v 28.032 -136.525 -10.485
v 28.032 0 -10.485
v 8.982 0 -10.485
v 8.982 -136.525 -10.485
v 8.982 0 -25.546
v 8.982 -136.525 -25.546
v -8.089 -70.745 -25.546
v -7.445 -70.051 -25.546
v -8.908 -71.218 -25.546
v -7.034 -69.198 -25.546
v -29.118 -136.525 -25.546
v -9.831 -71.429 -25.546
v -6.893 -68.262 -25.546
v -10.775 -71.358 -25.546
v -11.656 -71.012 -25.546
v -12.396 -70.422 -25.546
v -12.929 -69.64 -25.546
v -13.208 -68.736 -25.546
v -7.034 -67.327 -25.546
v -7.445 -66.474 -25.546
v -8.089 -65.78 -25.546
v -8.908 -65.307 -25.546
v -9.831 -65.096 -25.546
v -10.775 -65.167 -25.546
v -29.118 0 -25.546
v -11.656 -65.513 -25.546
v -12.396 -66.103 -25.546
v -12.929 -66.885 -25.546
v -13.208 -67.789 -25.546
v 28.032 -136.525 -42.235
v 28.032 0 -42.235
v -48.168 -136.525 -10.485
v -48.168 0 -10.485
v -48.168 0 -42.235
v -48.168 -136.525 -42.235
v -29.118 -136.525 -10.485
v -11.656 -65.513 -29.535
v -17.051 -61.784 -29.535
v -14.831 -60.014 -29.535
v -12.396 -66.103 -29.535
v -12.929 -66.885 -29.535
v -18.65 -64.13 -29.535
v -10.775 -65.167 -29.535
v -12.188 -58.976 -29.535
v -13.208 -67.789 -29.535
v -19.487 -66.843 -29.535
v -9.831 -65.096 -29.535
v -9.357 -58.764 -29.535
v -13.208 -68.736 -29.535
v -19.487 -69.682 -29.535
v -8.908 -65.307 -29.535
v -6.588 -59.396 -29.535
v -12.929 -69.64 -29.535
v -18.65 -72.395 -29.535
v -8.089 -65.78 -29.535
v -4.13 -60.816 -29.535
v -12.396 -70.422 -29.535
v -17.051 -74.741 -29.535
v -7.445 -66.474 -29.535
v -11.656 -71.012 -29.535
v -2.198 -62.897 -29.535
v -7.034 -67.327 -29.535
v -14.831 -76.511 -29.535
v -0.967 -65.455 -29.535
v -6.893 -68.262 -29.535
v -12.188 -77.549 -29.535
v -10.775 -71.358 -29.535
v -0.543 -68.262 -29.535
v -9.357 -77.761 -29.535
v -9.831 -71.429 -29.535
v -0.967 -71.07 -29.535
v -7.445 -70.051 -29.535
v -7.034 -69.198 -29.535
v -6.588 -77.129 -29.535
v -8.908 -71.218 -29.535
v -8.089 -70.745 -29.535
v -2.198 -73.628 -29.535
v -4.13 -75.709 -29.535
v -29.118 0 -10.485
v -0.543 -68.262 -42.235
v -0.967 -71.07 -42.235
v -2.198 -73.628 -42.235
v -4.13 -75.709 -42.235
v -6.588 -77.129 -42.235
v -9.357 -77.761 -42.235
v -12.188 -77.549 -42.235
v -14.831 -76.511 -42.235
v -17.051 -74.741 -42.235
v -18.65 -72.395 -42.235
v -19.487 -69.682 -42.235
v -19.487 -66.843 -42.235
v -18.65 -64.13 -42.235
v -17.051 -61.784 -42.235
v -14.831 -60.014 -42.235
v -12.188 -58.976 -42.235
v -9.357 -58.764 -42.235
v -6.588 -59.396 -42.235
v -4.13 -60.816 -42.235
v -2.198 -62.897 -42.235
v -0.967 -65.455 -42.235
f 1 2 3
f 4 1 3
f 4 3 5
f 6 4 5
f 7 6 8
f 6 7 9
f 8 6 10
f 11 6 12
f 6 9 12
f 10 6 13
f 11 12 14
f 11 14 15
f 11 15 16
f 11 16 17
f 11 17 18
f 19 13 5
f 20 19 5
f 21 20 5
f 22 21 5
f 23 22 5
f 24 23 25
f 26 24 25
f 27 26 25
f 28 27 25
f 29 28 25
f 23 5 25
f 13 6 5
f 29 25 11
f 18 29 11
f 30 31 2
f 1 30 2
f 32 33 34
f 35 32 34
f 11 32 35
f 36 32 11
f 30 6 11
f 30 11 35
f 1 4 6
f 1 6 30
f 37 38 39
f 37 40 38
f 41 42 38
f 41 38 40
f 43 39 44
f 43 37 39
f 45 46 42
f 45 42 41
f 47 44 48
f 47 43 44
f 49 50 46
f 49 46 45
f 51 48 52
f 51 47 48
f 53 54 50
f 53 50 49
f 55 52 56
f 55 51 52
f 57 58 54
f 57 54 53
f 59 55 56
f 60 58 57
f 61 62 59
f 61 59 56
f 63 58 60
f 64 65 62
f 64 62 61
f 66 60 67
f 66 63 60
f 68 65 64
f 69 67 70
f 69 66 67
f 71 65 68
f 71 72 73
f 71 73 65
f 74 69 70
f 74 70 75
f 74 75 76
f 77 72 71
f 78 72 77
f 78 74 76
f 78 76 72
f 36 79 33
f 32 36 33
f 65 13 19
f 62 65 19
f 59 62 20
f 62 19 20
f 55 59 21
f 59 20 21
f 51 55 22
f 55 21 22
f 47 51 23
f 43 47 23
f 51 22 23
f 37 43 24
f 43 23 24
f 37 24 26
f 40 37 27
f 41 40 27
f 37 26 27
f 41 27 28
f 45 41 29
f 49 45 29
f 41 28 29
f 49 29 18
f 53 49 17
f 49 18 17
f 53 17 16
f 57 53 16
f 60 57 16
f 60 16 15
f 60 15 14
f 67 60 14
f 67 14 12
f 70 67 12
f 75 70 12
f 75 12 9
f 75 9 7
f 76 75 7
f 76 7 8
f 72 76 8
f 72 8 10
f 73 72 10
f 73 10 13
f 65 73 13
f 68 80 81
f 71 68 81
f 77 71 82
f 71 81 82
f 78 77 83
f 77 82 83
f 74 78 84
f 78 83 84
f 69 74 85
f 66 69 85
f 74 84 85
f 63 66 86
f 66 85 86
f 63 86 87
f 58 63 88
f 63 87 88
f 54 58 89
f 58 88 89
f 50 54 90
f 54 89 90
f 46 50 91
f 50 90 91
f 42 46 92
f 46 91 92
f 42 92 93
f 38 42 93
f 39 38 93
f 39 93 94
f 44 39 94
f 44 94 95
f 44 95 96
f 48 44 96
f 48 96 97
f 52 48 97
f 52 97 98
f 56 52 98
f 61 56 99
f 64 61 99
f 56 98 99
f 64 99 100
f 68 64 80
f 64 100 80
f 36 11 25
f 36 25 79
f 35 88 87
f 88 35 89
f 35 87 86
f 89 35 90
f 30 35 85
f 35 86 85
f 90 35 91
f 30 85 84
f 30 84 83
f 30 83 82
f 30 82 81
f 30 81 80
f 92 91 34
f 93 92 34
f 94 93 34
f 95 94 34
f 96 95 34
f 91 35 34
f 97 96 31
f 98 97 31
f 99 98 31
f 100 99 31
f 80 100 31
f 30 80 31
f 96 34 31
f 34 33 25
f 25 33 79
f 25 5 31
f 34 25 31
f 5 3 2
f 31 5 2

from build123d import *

# Parameters (mm, degrees)
F1_DEPTH = 136.525
F2_R     = 3.175
F3_DEPTH = 6.35
F5_R     = 9.525
F6_DEPTH = 12.7
F4_R     = 3.175
F7_DEPTH = 25.4


with BuildPart() as f1:
    # F0 (on Front) → F1 (new body)
    with BuildSketch(Plane.XZ):
        Polygon((-48.16837, -10.484883), (-48.16837, -42.234883), (28.03163, -42.234883), (28.03163, -10.484883), (8.98163, -10.484883), (8.98163, -25.545781), (-29.11837, -25.545781), (-29.11837, -10.484883), align=None)
    extrude(amount=F1_DEPTH)

    # F2 (on face) → F3 (join)
    with BuildSketch(Plane.XY.offset(-25.545781)):
        with Locations((-10.06837, -68.2625)):
            Circle(F2_R)
    extrude(amount=-F3_DEPTH)

    # F5 (on face) → F6 (cut)
    with BuildSketch(Plane(origin=(0, 0, -42.234883), x_dir=(1, 0, 0), z_dir=(0, 0, -1))):
        with Locations((-10.06837, 68.2625)):
            Circle(F5_R)
    extrude(amount=-F6_DEPTH, mode=Mode.SUBTRACT)

    # F4 (on face) → F7 (cut)
    with BuildSketch(Plane.XY.offset(-25.545781)):
        with Locations((-10.06837, -68.2625)):
            Circle(F4_R)
    extrude(amount=-F7_DEPTH, mode=Mode.SUBTRACT)


solid = f1.part
